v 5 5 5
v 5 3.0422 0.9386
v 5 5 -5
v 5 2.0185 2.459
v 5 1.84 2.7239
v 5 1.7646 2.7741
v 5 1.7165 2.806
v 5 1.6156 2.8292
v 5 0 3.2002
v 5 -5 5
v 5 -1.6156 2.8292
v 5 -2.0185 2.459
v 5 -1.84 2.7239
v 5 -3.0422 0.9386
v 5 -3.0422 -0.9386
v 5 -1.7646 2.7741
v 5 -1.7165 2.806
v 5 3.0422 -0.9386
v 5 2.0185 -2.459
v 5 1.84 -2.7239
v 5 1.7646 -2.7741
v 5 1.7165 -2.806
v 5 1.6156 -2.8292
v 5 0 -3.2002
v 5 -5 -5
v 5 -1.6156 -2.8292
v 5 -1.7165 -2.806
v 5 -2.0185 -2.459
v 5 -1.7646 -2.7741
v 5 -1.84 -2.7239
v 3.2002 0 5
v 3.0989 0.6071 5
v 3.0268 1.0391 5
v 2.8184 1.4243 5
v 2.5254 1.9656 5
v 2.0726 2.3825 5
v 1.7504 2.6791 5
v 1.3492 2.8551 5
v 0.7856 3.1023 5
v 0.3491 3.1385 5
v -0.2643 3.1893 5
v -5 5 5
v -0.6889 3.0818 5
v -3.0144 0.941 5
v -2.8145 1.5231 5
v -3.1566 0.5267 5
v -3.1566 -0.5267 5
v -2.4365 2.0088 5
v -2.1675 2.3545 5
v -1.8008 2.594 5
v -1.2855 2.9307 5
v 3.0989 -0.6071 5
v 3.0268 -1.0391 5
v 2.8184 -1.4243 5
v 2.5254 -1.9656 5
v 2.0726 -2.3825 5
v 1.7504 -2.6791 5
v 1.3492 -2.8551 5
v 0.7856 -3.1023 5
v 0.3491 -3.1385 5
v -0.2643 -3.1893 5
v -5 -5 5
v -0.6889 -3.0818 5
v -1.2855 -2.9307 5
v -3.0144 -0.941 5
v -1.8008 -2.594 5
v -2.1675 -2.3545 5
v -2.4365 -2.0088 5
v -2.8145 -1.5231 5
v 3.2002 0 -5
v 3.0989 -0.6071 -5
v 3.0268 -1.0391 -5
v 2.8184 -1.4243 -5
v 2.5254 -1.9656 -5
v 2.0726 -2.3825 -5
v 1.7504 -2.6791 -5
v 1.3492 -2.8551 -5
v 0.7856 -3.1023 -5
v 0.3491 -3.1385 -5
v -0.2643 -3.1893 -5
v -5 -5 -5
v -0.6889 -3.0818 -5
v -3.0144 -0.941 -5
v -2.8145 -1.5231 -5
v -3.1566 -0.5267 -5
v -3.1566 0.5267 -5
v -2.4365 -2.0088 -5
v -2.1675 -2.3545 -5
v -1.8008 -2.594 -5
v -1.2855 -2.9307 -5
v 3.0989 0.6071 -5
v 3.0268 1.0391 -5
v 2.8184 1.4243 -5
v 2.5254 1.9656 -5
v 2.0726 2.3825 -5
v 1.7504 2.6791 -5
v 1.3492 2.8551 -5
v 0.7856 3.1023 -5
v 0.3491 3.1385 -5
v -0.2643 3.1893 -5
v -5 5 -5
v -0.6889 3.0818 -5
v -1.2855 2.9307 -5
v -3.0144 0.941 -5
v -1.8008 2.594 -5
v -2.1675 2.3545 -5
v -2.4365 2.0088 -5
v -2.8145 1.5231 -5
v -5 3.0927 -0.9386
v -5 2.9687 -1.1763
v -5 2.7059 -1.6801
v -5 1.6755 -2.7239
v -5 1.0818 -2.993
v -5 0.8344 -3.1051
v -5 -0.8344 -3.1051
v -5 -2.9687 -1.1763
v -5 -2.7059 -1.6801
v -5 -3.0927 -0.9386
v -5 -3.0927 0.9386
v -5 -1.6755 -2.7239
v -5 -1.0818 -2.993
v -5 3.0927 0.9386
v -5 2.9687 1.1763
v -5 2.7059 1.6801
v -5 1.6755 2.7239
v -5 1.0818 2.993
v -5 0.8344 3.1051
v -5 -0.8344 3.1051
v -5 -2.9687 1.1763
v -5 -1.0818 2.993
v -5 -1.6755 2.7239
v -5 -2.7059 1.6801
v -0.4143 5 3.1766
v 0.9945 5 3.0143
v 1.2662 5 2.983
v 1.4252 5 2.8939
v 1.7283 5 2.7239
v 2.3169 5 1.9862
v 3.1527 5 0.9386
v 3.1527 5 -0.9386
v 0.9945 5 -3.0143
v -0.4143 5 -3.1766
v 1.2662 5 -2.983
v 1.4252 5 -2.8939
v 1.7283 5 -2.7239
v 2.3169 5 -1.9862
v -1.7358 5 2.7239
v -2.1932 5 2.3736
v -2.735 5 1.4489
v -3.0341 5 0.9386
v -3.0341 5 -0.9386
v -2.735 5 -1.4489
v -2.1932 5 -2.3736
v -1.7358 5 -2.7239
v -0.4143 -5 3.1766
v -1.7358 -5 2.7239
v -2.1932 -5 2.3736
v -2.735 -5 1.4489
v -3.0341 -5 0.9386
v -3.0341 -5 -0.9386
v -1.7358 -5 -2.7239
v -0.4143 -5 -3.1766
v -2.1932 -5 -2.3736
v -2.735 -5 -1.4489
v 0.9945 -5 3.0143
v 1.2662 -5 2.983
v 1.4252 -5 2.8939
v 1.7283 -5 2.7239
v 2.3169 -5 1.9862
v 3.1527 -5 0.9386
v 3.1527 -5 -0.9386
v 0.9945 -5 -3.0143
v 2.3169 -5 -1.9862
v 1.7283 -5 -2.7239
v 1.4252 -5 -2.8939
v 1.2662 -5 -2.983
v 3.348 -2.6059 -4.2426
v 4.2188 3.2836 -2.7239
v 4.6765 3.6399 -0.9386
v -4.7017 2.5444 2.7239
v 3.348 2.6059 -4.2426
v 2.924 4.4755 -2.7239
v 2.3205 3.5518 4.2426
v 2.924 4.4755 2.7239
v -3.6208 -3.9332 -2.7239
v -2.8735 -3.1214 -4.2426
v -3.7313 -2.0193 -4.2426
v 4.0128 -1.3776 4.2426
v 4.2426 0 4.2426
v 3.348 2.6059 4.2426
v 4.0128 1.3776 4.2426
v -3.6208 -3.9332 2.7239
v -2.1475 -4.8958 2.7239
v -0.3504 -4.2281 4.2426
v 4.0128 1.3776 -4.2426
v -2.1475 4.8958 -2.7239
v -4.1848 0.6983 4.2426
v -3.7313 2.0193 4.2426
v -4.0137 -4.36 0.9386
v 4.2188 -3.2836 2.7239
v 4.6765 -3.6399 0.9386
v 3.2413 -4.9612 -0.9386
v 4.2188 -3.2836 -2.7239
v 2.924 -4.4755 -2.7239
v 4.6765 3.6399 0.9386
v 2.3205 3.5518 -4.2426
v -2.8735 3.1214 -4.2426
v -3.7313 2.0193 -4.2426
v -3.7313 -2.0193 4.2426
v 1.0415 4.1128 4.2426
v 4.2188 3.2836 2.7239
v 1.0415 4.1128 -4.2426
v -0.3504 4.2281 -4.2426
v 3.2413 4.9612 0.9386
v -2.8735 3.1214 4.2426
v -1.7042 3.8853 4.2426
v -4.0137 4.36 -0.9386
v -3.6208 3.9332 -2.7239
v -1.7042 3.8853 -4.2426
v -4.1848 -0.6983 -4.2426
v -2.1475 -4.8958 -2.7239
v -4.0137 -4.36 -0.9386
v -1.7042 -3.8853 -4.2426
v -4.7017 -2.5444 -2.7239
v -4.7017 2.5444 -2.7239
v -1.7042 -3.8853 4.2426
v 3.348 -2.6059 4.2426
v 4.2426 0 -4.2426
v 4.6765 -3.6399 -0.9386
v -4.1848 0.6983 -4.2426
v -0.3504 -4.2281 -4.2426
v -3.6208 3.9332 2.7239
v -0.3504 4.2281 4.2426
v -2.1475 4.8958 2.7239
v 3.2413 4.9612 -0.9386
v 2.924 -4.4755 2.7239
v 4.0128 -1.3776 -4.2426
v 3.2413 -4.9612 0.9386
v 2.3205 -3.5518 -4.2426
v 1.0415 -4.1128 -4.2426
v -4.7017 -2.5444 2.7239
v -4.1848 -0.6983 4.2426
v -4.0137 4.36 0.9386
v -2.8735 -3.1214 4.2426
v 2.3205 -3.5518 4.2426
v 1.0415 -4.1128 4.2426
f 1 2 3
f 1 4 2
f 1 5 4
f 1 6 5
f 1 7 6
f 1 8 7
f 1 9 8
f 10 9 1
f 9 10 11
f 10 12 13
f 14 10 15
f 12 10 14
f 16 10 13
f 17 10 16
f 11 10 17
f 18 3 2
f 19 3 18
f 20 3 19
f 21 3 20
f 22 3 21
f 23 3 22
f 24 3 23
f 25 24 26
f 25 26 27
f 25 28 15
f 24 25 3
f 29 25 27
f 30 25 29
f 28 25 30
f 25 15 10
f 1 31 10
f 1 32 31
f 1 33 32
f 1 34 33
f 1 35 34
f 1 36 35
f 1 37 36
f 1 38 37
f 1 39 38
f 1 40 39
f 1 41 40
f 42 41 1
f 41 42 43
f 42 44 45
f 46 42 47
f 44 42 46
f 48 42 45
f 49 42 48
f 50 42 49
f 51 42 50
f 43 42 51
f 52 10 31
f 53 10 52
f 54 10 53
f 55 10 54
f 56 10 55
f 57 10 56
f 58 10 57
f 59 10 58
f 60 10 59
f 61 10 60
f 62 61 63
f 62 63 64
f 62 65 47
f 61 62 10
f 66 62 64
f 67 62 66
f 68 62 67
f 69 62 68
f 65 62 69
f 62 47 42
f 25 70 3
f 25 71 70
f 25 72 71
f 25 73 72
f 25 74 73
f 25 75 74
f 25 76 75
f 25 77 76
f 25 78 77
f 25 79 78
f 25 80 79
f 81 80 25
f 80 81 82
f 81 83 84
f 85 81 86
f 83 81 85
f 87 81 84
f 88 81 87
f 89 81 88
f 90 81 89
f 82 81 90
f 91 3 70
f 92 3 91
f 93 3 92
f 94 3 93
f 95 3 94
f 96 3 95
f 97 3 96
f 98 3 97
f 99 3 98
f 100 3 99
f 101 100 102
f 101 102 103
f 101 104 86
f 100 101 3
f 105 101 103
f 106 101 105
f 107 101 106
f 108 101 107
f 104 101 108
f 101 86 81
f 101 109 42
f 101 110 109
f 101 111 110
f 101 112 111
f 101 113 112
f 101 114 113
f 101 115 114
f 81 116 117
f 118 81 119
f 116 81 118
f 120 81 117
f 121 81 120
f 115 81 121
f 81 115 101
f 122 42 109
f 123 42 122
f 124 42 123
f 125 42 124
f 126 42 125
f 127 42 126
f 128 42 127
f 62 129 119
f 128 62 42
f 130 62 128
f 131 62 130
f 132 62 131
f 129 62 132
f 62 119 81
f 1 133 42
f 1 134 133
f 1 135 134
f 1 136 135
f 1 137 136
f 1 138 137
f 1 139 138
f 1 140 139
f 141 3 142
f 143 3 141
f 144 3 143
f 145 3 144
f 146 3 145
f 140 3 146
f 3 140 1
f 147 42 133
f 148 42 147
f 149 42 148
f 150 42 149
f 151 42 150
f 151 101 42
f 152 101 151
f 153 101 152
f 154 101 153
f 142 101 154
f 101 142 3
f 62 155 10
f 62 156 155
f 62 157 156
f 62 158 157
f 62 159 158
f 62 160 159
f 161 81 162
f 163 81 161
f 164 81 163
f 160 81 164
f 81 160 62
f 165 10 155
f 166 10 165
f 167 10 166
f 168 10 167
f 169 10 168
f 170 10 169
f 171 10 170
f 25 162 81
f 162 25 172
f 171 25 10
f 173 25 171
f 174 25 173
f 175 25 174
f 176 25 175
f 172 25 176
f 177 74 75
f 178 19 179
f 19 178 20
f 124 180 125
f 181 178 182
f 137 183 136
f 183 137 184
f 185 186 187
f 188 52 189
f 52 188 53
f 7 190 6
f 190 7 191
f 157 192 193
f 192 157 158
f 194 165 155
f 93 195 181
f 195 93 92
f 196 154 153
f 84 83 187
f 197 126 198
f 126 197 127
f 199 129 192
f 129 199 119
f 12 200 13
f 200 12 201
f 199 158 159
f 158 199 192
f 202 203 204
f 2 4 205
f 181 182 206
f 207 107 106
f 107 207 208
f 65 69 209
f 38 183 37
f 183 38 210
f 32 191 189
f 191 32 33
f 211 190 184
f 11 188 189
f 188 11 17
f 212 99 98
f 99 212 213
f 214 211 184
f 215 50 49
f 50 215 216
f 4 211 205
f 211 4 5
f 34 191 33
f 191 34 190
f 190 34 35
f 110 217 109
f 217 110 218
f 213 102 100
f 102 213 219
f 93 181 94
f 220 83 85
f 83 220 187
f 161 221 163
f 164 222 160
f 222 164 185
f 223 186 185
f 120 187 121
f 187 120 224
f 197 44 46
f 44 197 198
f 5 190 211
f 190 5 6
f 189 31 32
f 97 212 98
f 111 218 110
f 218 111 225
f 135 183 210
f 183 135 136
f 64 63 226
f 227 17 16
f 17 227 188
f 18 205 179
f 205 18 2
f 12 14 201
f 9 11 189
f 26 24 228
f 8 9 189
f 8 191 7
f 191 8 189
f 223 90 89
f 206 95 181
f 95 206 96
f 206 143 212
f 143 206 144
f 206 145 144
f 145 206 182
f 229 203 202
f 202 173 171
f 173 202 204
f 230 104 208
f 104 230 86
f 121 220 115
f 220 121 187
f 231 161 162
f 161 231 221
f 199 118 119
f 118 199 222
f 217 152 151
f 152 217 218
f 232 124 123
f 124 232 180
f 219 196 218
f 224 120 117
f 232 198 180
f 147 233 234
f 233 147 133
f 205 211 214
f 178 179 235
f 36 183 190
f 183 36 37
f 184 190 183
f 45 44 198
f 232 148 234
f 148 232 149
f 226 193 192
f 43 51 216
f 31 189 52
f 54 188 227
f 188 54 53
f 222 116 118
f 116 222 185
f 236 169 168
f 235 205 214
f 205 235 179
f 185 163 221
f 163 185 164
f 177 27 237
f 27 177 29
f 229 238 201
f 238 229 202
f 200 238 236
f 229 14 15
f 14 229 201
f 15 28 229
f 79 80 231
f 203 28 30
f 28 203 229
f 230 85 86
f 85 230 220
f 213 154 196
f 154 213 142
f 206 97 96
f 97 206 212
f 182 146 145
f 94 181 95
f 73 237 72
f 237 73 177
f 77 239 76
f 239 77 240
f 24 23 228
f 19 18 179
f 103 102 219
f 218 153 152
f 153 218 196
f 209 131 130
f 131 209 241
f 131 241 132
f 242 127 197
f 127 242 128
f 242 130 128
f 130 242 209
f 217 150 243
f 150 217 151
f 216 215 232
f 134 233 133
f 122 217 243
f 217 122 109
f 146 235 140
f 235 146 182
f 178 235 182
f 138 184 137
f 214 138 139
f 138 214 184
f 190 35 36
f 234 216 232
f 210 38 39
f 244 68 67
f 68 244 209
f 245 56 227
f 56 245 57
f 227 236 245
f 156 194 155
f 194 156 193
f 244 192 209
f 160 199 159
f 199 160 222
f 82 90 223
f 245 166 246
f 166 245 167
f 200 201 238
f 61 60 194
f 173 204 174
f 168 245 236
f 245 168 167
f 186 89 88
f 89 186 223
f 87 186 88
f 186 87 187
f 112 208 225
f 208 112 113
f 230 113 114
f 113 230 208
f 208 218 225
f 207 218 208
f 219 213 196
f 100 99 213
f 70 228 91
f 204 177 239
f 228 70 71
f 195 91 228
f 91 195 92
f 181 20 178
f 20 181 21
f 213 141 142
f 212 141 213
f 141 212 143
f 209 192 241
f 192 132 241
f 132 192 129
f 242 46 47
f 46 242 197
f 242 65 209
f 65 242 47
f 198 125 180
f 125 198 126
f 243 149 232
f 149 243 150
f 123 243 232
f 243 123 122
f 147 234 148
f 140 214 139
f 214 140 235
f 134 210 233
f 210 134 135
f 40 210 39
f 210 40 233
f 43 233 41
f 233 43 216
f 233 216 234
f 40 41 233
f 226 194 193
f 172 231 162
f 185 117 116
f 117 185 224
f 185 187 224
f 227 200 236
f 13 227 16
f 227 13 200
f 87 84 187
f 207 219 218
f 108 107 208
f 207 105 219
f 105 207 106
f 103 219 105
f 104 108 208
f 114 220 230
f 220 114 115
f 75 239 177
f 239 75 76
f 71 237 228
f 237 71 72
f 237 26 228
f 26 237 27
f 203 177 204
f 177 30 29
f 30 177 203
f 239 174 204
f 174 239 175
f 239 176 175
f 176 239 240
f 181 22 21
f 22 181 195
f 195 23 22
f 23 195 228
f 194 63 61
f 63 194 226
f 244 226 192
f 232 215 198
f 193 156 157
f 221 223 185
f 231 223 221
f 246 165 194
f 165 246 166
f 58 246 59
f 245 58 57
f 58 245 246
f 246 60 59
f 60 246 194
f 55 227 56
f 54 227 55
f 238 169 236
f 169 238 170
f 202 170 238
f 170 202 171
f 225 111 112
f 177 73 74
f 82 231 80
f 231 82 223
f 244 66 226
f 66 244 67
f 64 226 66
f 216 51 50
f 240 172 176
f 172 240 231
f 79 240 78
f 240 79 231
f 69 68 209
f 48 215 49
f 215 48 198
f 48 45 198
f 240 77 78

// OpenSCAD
difference (){
cube (10,center=true);
sphere (6,center=true);
}
